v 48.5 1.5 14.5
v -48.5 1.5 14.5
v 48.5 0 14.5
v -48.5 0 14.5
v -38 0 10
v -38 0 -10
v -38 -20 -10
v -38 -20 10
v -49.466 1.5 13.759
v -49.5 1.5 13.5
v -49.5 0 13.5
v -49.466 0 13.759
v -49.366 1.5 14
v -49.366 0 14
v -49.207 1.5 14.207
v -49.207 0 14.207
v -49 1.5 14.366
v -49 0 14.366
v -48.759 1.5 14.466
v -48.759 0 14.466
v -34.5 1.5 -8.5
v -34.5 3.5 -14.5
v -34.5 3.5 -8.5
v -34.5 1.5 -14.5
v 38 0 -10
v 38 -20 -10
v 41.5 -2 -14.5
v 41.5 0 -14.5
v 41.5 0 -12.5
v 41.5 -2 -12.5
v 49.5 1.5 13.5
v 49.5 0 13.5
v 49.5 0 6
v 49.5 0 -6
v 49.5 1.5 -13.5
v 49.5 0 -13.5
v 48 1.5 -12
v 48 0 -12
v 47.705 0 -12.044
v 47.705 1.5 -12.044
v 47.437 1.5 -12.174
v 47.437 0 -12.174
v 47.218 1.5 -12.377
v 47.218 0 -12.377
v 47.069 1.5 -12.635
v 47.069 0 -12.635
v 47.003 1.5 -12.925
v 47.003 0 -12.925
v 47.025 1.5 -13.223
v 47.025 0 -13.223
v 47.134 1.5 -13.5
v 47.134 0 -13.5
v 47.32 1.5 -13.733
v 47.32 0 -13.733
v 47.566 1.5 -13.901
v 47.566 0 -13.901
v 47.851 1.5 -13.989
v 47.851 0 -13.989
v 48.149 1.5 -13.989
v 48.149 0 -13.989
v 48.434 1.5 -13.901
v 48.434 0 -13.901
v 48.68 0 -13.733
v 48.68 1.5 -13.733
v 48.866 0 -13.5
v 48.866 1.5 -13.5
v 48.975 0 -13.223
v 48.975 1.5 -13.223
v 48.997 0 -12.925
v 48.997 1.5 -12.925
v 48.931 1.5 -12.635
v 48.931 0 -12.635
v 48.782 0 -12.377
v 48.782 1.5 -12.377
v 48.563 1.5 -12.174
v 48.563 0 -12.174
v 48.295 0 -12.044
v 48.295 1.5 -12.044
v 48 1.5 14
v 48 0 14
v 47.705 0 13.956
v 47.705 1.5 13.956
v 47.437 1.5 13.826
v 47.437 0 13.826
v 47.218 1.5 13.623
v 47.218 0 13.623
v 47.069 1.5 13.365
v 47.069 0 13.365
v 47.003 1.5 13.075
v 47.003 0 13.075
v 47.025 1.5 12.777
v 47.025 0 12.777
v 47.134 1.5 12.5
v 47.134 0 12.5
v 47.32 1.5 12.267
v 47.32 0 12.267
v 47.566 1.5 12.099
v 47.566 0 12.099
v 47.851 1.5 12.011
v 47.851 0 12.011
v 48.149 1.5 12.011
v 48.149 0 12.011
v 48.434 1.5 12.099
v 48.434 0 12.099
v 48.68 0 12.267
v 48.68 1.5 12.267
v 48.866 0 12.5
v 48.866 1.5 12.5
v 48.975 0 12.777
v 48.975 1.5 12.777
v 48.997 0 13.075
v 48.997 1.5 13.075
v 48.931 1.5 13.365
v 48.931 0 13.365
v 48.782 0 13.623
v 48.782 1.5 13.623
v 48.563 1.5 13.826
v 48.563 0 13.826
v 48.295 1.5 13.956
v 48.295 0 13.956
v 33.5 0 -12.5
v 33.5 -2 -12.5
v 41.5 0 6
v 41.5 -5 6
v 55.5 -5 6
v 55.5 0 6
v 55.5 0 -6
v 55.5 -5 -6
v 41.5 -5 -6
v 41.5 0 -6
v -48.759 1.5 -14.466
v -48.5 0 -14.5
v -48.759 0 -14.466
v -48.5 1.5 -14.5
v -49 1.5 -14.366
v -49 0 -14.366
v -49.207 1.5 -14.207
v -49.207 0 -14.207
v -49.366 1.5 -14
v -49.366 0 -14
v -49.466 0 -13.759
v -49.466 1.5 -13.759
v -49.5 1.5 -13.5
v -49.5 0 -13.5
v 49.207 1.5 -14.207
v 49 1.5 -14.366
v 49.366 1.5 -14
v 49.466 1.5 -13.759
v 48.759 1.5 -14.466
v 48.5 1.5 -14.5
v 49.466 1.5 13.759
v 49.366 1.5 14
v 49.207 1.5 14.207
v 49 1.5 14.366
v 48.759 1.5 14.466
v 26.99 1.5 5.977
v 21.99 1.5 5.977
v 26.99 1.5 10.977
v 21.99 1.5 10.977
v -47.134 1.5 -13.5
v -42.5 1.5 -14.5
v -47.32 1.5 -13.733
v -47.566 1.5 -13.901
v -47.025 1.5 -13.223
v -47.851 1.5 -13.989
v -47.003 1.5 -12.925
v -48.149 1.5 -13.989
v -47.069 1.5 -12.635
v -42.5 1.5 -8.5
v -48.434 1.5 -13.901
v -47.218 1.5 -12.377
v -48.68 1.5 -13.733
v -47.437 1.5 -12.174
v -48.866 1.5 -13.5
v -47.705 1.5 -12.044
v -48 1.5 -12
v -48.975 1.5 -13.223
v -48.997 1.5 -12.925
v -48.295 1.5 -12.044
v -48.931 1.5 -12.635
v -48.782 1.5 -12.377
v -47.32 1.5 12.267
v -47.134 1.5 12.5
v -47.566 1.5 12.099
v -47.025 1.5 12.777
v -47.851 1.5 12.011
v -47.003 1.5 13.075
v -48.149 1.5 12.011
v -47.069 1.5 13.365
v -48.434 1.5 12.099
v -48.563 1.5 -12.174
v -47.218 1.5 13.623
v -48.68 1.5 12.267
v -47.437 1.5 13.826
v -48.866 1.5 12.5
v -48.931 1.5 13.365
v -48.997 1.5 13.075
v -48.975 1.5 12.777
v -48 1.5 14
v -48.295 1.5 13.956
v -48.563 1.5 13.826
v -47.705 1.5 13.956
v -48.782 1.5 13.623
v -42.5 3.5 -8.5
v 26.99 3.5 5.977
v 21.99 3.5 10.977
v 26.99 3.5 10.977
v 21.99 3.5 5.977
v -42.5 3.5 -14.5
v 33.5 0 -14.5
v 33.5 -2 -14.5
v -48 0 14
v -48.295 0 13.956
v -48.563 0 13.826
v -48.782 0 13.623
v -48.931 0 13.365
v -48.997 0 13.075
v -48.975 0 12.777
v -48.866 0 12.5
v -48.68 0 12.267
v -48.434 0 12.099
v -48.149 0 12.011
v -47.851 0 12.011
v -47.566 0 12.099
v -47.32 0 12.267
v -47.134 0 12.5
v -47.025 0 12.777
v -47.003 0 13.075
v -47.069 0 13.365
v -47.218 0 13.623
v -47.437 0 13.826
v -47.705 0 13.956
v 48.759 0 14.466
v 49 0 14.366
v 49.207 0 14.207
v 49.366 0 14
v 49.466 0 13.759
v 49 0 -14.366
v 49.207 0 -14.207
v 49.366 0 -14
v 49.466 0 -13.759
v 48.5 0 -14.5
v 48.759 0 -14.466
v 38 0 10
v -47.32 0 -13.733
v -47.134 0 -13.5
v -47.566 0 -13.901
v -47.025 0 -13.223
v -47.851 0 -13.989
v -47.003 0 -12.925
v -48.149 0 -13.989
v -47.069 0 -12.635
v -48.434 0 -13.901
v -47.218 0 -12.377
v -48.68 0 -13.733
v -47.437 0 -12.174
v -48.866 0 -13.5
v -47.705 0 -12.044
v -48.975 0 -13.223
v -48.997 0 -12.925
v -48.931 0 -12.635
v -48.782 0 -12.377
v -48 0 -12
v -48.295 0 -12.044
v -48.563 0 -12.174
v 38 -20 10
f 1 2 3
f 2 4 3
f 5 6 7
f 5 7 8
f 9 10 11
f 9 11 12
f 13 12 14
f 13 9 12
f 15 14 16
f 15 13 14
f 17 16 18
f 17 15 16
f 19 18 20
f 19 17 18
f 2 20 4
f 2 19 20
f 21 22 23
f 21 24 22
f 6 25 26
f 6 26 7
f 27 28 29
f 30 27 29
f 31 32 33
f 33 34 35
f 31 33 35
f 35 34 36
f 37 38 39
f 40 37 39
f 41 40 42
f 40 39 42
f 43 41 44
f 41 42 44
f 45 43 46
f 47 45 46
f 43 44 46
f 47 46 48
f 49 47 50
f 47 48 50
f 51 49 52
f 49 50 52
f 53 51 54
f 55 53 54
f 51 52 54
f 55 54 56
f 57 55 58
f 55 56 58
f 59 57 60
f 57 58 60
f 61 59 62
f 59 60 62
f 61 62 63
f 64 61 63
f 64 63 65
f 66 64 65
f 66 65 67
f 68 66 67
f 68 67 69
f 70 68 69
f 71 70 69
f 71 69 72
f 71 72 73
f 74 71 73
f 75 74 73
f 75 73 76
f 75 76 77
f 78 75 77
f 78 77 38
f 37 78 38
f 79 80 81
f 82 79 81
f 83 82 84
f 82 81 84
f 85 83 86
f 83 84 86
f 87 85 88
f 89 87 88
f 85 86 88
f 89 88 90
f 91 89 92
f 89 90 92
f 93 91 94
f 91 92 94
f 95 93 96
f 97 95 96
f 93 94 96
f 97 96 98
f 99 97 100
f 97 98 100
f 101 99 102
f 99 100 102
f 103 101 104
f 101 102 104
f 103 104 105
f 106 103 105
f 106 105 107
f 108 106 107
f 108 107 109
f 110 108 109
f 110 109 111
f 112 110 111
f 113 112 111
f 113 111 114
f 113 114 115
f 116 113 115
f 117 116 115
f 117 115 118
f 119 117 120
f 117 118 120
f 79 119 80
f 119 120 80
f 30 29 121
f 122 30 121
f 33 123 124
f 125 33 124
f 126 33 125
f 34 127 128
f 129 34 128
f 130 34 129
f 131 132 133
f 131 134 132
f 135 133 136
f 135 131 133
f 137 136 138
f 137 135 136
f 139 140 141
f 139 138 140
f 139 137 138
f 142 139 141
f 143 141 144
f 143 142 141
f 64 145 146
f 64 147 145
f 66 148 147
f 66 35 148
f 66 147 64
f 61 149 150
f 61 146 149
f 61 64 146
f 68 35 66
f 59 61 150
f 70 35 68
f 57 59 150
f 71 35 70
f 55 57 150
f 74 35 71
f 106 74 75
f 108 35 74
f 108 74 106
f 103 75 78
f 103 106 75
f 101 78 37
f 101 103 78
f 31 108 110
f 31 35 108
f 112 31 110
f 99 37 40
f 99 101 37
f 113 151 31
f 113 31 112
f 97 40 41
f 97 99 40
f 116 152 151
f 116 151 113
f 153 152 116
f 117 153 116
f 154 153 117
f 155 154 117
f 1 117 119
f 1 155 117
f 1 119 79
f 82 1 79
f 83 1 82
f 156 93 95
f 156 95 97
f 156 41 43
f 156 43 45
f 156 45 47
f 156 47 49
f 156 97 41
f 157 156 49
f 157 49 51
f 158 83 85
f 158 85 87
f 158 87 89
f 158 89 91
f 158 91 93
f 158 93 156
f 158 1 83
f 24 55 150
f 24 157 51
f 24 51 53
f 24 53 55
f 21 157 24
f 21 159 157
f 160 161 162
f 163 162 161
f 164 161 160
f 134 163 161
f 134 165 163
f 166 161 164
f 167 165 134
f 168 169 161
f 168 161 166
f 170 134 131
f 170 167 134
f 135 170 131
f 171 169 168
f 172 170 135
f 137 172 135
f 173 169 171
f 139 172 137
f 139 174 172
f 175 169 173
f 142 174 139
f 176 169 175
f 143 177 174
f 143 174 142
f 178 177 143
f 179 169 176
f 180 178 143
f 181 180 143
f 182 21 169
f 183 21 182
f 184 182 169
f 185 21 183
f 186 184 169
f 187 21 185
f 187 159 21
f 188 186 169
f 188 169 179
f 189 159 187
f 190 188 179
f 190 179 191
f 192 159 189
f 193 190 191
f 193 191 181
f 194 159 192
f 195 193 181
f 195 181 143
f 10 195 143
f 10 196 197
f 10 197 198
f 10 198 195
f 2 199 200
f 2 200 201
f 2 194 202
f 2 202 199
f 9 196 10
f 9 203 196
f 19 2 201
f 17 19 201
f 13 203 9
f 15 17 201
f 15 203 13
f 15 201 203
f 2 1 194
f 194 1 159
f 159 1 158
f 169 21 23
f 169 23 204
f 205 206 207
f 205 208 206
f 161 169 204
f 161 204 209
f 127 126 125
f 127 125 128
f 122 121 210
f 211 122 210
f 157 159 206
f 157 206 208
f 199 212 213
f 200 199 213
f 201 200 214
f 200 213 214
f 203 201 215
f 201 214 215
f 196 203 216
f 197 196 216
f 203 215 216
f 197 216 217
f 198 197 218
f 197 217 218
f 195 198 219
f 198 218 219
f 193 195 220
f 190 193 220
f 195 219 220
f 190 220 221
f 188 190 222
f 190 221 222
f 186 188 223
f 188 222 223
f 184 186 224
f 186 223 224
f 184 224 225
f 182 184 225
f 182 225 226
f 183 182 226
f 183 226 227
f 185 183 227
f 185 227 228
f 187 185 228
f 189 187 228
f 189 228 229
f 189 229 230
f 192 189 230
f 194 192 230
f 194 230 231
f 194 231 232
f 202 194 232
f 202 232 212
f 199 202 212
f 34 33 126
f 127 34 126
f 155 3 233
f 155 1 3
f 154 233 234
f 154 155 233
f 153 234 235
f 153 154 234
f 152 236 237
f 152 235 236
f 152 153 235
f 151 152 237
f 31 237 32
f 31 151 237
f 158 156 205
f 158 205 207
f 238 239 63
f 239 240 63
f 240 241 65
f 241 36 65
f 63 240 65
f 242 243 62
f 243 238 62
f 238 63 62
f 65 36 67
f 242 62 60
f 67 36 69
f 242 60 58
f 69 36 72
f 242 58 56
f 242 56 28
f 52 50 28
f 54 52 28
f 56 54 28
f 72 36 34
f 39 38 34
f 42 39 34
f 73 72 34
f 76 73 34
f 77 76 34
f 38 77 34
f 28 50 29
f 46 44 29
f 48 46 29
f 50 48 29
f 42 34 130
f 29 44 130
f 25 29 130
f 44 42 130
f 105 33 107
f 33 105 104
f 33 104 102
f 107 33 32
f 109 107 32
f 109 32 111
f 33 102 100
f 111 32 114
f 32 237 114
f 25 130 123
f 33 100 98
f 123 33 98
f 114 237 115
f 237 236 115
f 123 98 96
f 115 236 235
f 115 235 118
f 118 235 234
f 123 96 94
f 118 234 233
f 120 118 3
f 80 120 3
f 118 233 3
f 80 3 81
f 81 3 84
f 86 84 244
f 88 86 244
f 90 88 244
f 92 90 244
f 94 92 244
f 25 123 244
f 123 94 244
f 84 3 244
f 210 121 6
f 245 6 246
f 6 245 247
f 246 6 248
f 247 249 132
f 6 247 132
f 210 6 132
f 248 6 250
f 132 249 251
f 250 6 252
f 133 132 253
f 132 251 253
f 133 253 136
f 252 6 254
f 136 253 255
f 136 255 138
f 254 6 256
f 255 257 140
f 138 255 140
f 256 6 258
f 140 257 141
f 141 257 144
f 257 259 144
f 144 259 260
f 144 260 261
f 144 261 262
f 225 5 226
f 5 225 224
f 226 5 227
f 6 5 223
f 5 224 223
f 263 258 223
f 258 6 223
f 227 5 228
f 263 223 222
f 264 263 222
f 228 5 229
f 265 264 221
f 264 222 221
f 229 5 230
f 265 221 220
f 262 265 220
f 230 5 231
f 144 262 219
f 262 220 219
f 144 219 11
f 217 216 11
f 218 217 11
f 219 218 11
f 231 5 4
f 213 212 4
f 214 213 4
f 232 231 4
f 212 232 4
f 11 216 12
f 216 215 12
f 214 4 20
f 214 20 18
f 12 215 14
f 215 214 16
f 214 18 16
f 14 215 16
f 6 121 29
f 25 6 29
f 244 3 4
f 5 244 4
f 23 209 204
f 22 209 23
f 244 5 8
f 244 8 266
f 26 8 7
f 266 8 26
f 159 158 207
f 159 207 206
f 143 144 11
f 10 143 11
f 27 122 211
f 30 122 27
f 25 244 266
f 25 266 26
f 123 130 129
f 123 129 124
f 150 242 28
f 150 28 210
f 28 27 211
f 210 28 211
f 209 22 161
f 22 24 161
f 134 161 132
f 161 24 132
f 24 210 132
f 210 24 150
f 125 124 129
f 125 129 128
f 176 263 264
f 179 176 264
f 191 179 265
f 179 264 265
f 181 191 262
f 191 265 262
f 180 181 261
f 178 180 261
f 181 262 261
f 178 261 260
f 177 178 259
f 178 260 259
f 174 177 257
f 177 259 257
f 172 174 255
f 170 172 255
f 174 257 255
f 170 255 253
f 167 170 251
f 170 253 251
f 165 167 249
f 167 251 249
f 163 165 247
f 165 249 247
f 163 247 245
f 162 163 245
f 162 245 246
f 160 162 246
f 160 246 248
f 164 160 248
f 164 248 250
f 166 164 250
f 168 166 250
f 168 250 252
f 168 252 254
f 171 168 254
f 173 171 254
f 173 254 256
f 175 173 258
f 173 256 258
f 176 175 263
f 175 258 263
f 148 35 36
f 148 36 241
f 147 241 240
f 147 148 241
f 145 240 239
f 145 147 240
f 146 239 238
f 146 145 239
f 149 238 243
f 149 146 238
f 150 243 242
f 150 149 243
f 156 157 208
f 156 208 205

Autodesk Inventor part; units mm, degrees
ref_plane "YZ Plane" through (0, 0, 0) normal (1, 0, 0) x (0, 1, 0)
ref_plane "XZ Plane" through (0, 0, 0) normal (0, 1, 0) x (-1, 0, 0)
ref_plane "XY Plane" through (0, 0, 0) normal (0, 0, 1) x (1, 0, 0)
sketch "Sketch1" plane through (0, 0, 0) normal (0, 1, 0) x (-1, 0, 0)
  line L0 (49.5, 14.5) -> (-49.5, 14.5)
  line L1 (-49.5, 14.5) -> (-49.5, -14.5)
  line L2 (-49.5, -14.5) -> (49.5, -14.5)
  line L3 (49.5, -14.5) -> (49.5, 14.5)
  line L4 (49.5, 14.5) -> (-49.5, -14.5) construction
  line L5 (-49.5, 14.5) -> (49.5, -14.5) construction
  point P0 (0, 0)
  dimension "d0" = 99
  dimension "d1" = 29
extrude "Extrusion1" add sketch "Sketch1" along normal blind 1.5
fillet "Fillet1" radius 1 4 edges at (49.5, 0.75, 14.5) (49.5, 0.75, -14.5) (-49.5, 0.75, -14.5) (-49.5, 0.75, 14.5)
sketch "Sketch2" plane through (0, 1.5, 0) normal (0, 1, 0) x (1, 0, 0)
  line L0 (26.9904, -10.9774) -> (21.9904, -10.9774)
  line L1 (21.9904, -10.9774) -> (21.9904, -5.9774)
  line L2 (21.9904, -5.9774) -> (26.9904, -5.9774)
  line L3 (26.9904, -5.9774) -> (26.9904, -10.9774)
  line L4 (26.9904, -10.9774) -> (21.9904, -5.9774) construction
  line L5 (21.9904, -10.9774) -> (26.9904, -5.9774) construction
  point P0 (0, 0)
  point P1 (24.4904, -8.4774)
  dimension "d5" = 5
  dimension "d6" = 5
extrude "Extrusion2" add sketch "Sketch2" along normal blind 2
sketch "Sketch3" plane through (0, 1.5, 0) normal (0, 1, 0) x (1, 0, 0)
  line L0 (26.9904, -5.9774) -> (26.9904, -10.9774) construction
  line L1 (26.9904, -10.9774) -> (21.9904, -10.9774) construction
  line L2 (21.9904, -10.9774) -> (21.9904, -5.9774) construction
  line L3 (21.9904, -5.9774) -> (26.9904, -5.9774) construction
  arc A0 (-49.5, -13.5) -> (-48.5, -14.5) centre (-48.5, -13.5) ccw construction
  line L4 (-48.5, -14.5) -> (48.5, -14.5) construction
  arc A1 (48.5, -14.5) -> (49.5, -13.5) centre (48.5, -13.5) ccw construction
  line L5 (49.5, -13.5) -> (49.5, 13.5) construction
  arc A2 (49.5, 13.5) -> (48.5, 14.5) centre (48.5, 13.5) ccw construction
  line L6 (48.5, 14.5) -> (-48.5, 14.5) construction
  arc A3 (-48.5, 14.5) -> (-49.5, 13.5) centre (-48.5, 13.5) ccw construction
  line L7 (-49.5, 13.5) -> (-49.5, -13.5) construction
  line L8 (48, -13) -> (-48, -13) construction
  line L9 (-48, -13) -> (-48, 13) construction
  line L10 (-48, 13) -> (48, 13) construction
  line L11 (48, 13) -> (48, -13) construction
  point P0 (0, 0)
  dimension "d9" = 1.5
hole "Hole1" at (48, 1.5, 13) at (-48, 1.5, 13) at (-48, 1.5, -13) at (48, 1.5, -13) direction (0, -1, 0) diameter 2 depth 10 tip angle 118
sketch "Sketch4" plane through (0, 1.5, 0) normal (0, 1, 0) x (1, 0, 0)
  line L0 (-49.5, 13.5) -> (-49.5, -13.5) construction
  line L1 (-49.5, 10.3219) -> (-42.5, 10.3219) construction
  line L2 (-34.5, 8.5) -> (-42.5, 8.5)
  line L3 (-42.5, 8.5) -> (-42.5, 14.5)
  line L4 (-42.5, 14.5) -> (-34.5, 14.5)
  line L5 (-34.5, 14.5) -> (-34.5, 8.5)
  line L6 (-34.5, 8.5) -> (-42.5, 14.5) construction
  line L7 (-42.5, 8.5) -> (-34.5, 14.5) construction
  line L8 (48.5, 14.5) -> (-48.5, 14.5) construction
  point P0 (0, 0)
  point P1 (-38.5, 11.5)
  dimension "d17" = 7
  dimension "d18" = 8
  dimension "d19" = 6
extrude "Extrusion3" add sketch "Sketch4" along normal blind 2
sketch "Sketch5" plane through (0, 1.5, 0) normal (0, 1, 0) x (1, 0, 0)
  line L0 (49.5, -13.5) -> (49.5, 13.5) construction
  line L1 (49.5, 9.2214) -> (41.5, 9.2214) construction
  line L2 (48.5, 14.5) -> (-34.5, 14.5) construction
  line L3 (41.5, 12.5) -> (33.5, 12.5)
  line L4 (33.5, 12.5) -> (33.5, 14.5)
  line L5 (33.5, 14.5) -> (41.5, 14.5)
  line L6 (41.5, 14.5) -> (41.5, 12.5)
  line L7 (41.5, 12.5) -> (33.5, 14.5) construction
  line L8 (33.5, 12.5) -> (41.5, 14.5) construction
  point P0 (0, 0)
  point P1 (37.5, 13.5)
  dimension "d22" = 8
  dimension "d23" = 8
  dimension "d24" = 2
sketch "Sketch6" plane through (0, 0, 0) normal (0, -1, 0) x (1, 0, 0)
  line L0 (41.5, -12.5) -> (33.5, -12.5) projected
  line L1 (41.5, -14.5) -> (41.5, -12.5) projected
  line L2 (33.5, -12.5) -> (33.5, -14.5) projected
  line L3 (41.5, -14.5) -> (33.5, -14.5)
  point P0 (0, 0)
extrude "Extrusion4" add sketch "Sketch6" along normal blind 2
sketch "Sketch7" plane through (0, 0, 0) normal (0, -1, 0) x (1, 0, 0)
  line L0 (33.5, -14.5) -> (33.5, -12.5) construction
  line L1 (33.5, -12.5) -> (41.5, -12.5) construction
  line L2 (41.5, -12.5) -> (41.5, -14.5) construction
  line L3 (48.5, -14.5) -> (41.5, -14.5) construction
  arc A0 (48.5, -14.5) -> (49.5, -13.5) centre (48.5, -13.5) ccw construction
  line L4 (49.5, 13.5) -> (49.5, -13.5) construction
  arc A1 (49.5, 13.5) -> (48.5, 14.5) centre (48.5, 13.5) ccw construction
  line L5 (-48.5, 14.5) -> (48.5, 14.5) construction
  arc A2 (-48.5, 14.5) -> (-49.5, 13.5) centre (-48.5, 13.5) ccw construction
  line L6 (-49.5, -13.5) -> (-49.5, 13.5) construction
  arc A3 (-49.5, -13.5) -> (-48.5, -14.5) centre (-48.5, -13.5) ccw construction
  line L7 (33.5, -14.5) -> (-48.5, -14.5) construction
  circle A4 centre (48, -13) radius 1 construction
  circle A5 centre (-48, 13) radius 1 construction
  circle A6 centre (48, 13) radius 1 construction
  circle A7 centre (-48, -13) radius 1 construction
  line L8 (55.5, -6) -> (41.5, -6)
  line L9 (41.5, -6) -> (41.5, 6)
  line L10 (41.5, 6) -> (55.5, 6)
  line L11 (55.5, 6) -> (55.5, -6)
  line L12 (55.5, -6) -> (41.5, 6) construction
  line L13 (41.5, -6) -> (55.5, 6) construction
  line L14 (49.5, 0) -> (55.5, 0) construction
  point P0 (0, 0)
  point P1 (48.5, 0)
  dimension "d27" = 14
  dimension "d28" = 12
  dimension "d29" = 6
extrude "Extrusion5" add sketch "Sketch7" along normal blind 5
sketch "Sketch8" plane through (0, 0, 0) normal (0, -1, 0) x (1, 0, 0)
  line L0 (41.5, 6) -> (49.5, 6) construction
  line L1 (49.5, 13.5) -> (49.5, 6) construction
  arc A0 (49.5, 13.5) -> (48.5, 14.5) centre (48.5, 13.5) ccw construction
  line L2 (-48.5, 14.5) -> (48.5, 14.5) construction
  arc A1 (-48.5, 14.5) -> (-49.5, 13.5) centre (-48.5, 13.5) ccw construction
  line L3 (-49.5, -13.5) -> (-49.5, 13.5) construction
  arc A2 (-49.5, -13.5) -> (-48.5, -14.5) centre (-48.5, -13.5) ccw construction
  line L4 (33.5, -14.5) -> (-48.5, -14.5) construction
  line L5 (33.5, -14.5) -> (33.5, -12.5) construction
  line L6 (33.5, -12.5) -> (41.5, -12.5) construction
  line L7 (41.5, -12.5) -> (41.5, -14.5) construction
  line L8 (48.5, -14.5) -> (41.5, -14.5) construction
  arc A3 (48.5, -14.5) -> (49.5, -13.5) centre (48.5, -13.5) ccw construction
  line L9 (49.5, -6) -> (49.5, -13.5) construction
  line L10 (49.5, -6) -> (41.5, -6) construction
  line L11 (41.5, -6) -> (41.5, 6) construction
  circle A4 centre (48, -13) radius 1 construction
  circle A5 centre (-48, 13) radius 1 construction
  circle A6 centre (48, 13) radius 1 construction
  circle A7 centre (-48, -13) radius 1 construction
  line L12 (38, -10) -> (-38, -10)
  line L13 (-38, -10) -> (-38, 10)
  line L14 (-38, 10) -> (38, 10)
  line L15 (38, 10) -> (38, -10)
  line L16 (38, -10) -> (-38, 10) construction
  line L17 (-38, -10) -> (38, 10) construction
  point P0 (0, 0)
  point P1 (0, 0)
  point P2 (0, 0)
  dimension "d32" = 76
  dimension "d33" = 20
extrude "Extrusion6" add sketch "Sketch8" along normal blind 20
properties part number "battery_footprint"
